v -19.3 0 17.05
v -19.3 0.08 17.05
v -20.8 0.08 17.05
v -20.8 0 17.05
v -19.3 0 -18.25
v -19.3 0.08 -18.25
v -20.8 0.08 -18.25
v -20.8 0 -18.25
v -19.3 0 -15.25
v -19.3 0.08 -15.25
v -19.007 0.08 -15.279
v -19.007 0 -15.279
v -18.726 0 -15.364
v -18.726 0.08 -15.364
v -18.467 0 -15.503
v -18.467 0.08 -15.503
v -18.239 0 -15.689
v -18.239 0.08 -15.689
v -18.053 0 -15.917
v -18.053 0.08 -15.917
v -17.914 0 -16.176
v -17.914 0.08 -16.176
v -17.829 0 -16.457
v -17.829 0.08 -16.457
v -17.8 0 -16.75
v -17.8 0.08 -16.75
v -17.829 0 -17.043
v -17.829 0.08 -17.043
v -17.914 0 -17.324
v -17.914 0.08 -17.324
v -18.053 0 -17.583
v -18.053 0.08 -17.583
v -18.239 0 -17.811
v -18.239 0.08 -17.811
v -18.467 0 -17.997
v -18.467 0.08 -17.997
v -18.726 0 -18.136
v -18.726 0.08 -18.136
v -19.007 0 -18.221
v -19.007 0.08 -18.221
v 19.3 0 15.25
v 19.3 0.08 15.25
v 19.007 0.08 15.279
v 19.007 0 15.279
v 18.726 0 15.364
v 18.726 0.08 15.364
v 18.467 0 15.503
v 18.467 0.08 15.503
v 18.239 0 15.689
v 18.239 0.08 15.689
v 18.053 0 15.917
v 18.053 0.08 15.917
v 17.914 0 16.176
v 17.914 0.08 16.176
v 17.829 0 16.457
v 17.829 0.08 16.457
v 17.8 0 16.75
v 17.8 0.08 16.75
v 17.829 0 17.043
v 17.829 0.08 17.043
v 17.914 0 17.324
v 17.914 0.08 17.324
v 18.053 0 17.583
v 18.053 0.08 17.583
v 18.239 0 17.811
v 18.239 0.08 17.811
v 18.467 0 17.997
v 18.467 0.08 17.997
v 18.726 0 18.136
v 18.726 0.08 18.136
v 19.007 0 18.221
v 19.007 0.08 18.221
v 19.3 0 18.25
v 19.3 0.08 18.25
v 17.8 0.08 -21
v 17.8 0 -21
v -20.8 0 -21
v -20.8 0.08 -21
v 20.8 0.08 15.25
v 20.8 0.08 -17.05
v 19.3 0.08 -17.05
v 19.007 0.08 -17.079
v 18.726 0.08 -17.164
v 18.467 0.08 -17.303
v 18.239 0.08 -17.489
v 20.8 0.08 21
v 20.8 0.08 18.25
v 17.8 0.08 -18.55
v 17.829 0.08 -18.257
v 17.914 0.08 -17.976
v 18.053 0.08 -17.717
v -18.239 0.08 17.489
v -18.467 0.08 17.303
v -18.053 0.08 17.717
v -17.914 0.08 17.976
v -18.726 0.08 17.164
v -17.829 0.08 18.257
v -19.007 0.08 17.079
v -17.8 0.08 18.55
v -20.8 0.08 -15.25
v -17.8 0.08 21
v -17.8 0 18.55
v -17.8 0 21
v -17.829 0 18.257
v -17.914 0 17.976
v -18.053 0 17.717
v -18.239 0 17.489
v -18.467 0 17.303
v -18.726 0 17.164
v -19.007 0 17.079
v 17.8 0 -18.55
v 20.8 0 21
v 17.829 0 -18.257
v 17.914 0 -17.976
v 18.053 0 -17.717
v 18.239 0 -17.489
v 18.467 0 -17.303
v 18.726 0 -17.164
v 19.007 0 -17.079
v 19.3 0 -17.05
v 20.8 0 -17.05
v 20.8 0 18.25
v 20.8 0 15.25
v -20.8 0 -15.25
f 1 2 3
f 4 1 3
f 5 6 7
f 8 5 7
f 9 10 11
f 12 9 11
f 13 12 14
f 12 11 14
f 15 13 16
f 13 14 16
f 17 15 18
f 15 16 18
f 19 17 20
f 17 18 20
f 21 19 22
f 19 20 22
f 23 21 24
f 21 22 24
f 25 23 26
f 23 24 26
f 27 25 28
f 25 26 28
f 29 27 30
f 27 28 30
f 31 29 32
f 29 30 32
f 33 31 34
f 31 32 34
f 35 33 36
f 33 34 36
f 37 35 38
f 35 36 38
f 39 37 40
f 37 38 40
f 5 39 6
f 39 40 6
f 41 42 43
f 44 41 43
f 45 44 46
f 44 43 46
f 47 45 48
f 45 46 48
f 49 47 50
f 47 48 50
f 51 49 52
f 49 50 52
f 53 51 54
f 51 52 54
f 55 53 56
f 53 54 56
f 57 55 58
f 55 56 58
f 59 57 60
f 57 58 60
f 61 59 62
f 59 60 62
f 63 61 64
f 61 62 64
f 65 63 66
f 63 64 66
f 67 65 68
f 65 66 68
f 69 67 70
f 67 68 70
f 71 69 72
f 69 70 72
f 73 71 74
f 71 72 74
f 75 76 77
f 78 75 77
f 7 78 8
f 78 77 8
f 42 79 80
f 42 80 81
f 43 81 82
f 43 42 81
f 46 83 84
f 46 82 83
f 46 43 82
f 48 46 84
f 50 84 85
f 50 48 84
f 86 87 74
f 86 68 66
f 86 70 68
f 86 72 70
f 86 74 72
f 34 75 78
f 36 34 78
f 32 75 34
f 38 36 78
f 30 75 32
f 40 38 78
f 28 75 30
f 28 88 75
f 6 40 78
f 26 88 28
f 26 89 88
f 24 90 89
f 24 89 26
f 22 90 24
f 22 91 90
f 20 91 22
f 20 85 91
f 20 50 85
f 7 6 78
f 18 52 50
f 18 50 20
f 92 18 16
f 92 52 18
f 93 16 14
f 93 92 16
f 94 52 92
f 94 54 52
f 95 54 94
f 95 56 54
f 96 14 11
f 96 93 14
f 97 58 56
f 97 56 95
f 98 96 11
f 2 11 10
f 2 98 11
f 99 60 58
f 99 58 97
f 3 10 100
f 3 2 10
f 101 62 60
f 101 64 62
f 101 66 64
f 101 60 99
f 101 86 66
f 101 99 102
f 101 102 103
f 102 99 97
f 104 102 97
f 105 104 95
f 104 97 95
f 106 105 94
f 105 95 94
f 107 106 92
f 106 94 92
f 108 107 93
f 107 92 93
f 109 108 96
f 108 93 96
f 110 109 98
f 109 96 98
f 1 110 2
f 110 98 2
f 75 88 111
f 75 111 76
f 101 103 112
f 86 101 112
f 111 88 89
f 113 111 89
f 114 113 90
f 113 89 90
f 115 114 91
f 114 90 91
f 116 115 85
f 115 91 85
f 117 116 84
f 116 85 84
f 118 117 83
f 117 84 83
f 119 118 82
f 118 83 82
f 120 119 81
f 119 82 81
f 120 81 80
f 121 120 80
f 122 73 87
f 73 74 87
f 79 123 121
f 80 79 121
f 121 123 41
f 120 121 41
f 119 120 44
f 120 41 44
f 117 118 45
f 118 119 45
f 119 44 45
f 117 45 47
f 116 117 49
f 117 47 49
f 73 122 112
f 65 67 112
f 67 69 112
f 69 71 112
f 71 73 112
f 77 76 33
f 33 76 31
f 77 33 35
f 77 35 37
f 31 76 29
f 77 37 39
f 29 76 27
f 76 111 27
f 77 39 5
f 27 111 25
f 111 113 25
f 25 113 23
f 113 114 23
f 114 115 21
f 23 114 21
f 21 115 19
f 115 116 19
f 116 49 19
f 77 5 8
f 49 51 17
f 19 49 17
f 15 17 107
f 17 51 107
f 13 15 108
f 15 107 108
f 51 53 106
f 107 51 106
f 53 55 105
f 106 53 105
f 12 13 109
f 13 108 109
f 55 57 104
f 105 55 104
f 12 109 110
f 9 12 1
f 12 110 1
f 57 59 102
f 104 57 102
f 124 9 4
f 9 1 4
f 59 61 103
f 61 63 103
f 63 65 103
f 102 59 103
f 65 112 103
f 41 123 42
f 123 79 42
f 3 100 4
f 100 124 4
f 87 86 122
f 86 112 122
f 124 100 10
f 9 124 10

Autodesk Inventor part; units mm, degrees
ref_plane "YZ Plane" through (0, 0, 0) normal (1, 0, 0) x (0, 1, 0)
ref_plane "XZ Plane" through (0, 0, 0) normal (0, 1, 0) x (-1, 0, 0)
ref_plane "XY Plane" through (0, 0, 0) normal (0, 0, 1) x (1, 0, 0)
sketch "Sketch1" plane through (0, 0, 0) normal (0, 1, 0) x (-1, 0, 0)
  line L0 (-20.8, -21) -> (20.8, -21)
  line L1 (20.8, -21) -> (20.8, 21)
  line L2 (20.8, 21) -> (-20.8, 21)
  line L3 (-20.8, 21) -> (-20.8, -21)
  line L4 (-20.8, -21) -> (20.8, 21) construction
  line L5 (20.8, -21) -> (-20.8, 21) construction
  point P0 (0, 0)
  dimension "d0" = 42
  dimension "d1" = 41.6
extrude "Extrusion1" add sketch "Sketch1" along normal blind 0.08
sketch "Sketch2" plane through (0, 0.08, 0) normal (0, 1, 0) x (1, 0, 0)
  line L0 (-20.8, 21) -> (-20.8, -21) projected
  line L1 (-20.8, 18.3058) -> (-20.8, 15.1942)
  line L2 (-20.8, -17.05) -> (-20.8, -20.05)
  line L3 (20.8, 21) -> (-20.8, 21) projected
  line L4 (-22.3, 16.75) -> (-19.3, 16.75) construction
  line L5 (-22.3, 15.25) -> (-19.3, 15.25)
  line L6 (-19.3, 18.25) -> (-22.3, 18.25)
  arc A0 (-22.3, 18.25) -> (-22.3, 15.25) centre (-22.3, 16.75) ccw
  arc A1 (-19.3, 15.25) -> (-19.3, 18.25) centre (-19.3, 16.75) ccw
  line L7 (-22.3, -18.55) -> (-19.3, -18.55) construction
  line L8 (-22.3, -20.05) -> (-19.3, -20.05)
  line L9 (-19.3, -17.05) -> (-22.3, -17.05)
  arc A2 (-22.3, -17.05) -> (-22.3, -20.05) centre (-22.3, -18.55) ccw
  arc A3 (-19.3, -20.05) -> (-19.3, -17.05) centre (-19.3, -18.55) ccw
  line L10 (-20.8, -21) -> (20.8, -21) projected
  line L11 (20.8, -21) -> (20.8, 21) projected
  line L12 (22.3, -16.75) -> (19.3, -16.75) construction
  line L13 (22.3, -15.25) -> (19.3, -15.25)
  line L14 (20.8, -18.3058) -> (20.8, -15.1942)
  arc A4 (22.3, -18.25) -> (22.3, -15.25) centre (22.3, -16.75) ccw
  arc A5 (19.3, -15.25) -> (19.3, -18.25) centre (19.3, -16.75) ccw
  line L15 (19.3, -18.25) -> (22.3, -18.25)
  arc A6 (19.3, 20.05) -> (19.3, 17.05) centre (19.3, 18.55) ccw
  line L16 (19.3, 17.05) -> (22.3, 17.05)
  line L17 (20.8, 17.05) -> (20.8, 20.05)
  line L18 (22.3, 18.55) -> (19.3, 18.55) construction
  line L19 (22.3, 20.05) -> (19.3, 20.05)
  arc A7 (22.3, 17.05) -> (22.3, 20.05) centre (22.3, 18.55) ccw
  point P0 (-20.8, 16.75)
  point P1 (-20.8, 16.75)
  point P2 (-20.8, -18.55)
  point P3 (0, 0)
  point P4 (20.8, -16.75)
  point P5 (20.8, -16.75)
  point P6 (20.8, 18.55)
  point P7 (20.8, 17.05)
  point P8 (20.8, -18.25)
  point P9 (20.8, -15.25)
  point P10 (-20.8, 18.25)
  point P11 (-20.8, 15.25)
  dimension "d16" = 1.5
  dimension "d17" = 4.25
  dimension "d18" = 1.5
  dimension "d20" = 1.5
  dimension "d22" = 39.55
  dimension "d23" = 21
  dimension "d24" = 42
  dimension "d25" = 41.6
  dimension "d26" = 20.8
  dimension "d29" = 360
extrude "Extrusion2" cut sketch "Sketch2" against normal blind 0.08 contours L6 A1 L5 L0 | L11 L16 A6 L19 | L9 A3 L8 L0 | L11 L15 A5 L13
sketch "Sketch3" plane through (0, 0.08, 0) normal (0, 1, 0) x (1, 0, 0)
  arc A0 (19.3, 20.05) -> (19.3, 17.05) centre (19.3, 18.55) ccw projected
  line L0 (17.8, 18.55) -> (17.8, 21)
  line L1 (20.8, 21) -> (-20.8, 21) projected
  line L2 (20.8, 20.05) -> (20.8, 21) projected
  line L3 (19.3, 20.05) -> (20.8, 20.05) projected
  line L4 (-19.3, -20.05) -> (-20.8, -20.05) projected
  arc A1 (-19.3, -20.05) -> (-19.3, -17.05) centre (-19.3, -18.55) ccw projected
  line L5 (-20.8, -20.05) -> (-20.8, -21) projected
  line L6 (-20.8, -21) -> (20.8, -21) projected
  line L7 (-17.8, -18.55) -> (-17.8, -21)
  point P0 (0, 0)
extrude "Extrusion3" cut sketch "Sketch3" against normal blind 0.08
equation "\"d20\" = d16"
equation "\"d23\" = 0.5 * d24"
equation "\"d26\" = 0.5 * d25"
properties part number "Coverplate Film" material "Thermoplastic Resin"
